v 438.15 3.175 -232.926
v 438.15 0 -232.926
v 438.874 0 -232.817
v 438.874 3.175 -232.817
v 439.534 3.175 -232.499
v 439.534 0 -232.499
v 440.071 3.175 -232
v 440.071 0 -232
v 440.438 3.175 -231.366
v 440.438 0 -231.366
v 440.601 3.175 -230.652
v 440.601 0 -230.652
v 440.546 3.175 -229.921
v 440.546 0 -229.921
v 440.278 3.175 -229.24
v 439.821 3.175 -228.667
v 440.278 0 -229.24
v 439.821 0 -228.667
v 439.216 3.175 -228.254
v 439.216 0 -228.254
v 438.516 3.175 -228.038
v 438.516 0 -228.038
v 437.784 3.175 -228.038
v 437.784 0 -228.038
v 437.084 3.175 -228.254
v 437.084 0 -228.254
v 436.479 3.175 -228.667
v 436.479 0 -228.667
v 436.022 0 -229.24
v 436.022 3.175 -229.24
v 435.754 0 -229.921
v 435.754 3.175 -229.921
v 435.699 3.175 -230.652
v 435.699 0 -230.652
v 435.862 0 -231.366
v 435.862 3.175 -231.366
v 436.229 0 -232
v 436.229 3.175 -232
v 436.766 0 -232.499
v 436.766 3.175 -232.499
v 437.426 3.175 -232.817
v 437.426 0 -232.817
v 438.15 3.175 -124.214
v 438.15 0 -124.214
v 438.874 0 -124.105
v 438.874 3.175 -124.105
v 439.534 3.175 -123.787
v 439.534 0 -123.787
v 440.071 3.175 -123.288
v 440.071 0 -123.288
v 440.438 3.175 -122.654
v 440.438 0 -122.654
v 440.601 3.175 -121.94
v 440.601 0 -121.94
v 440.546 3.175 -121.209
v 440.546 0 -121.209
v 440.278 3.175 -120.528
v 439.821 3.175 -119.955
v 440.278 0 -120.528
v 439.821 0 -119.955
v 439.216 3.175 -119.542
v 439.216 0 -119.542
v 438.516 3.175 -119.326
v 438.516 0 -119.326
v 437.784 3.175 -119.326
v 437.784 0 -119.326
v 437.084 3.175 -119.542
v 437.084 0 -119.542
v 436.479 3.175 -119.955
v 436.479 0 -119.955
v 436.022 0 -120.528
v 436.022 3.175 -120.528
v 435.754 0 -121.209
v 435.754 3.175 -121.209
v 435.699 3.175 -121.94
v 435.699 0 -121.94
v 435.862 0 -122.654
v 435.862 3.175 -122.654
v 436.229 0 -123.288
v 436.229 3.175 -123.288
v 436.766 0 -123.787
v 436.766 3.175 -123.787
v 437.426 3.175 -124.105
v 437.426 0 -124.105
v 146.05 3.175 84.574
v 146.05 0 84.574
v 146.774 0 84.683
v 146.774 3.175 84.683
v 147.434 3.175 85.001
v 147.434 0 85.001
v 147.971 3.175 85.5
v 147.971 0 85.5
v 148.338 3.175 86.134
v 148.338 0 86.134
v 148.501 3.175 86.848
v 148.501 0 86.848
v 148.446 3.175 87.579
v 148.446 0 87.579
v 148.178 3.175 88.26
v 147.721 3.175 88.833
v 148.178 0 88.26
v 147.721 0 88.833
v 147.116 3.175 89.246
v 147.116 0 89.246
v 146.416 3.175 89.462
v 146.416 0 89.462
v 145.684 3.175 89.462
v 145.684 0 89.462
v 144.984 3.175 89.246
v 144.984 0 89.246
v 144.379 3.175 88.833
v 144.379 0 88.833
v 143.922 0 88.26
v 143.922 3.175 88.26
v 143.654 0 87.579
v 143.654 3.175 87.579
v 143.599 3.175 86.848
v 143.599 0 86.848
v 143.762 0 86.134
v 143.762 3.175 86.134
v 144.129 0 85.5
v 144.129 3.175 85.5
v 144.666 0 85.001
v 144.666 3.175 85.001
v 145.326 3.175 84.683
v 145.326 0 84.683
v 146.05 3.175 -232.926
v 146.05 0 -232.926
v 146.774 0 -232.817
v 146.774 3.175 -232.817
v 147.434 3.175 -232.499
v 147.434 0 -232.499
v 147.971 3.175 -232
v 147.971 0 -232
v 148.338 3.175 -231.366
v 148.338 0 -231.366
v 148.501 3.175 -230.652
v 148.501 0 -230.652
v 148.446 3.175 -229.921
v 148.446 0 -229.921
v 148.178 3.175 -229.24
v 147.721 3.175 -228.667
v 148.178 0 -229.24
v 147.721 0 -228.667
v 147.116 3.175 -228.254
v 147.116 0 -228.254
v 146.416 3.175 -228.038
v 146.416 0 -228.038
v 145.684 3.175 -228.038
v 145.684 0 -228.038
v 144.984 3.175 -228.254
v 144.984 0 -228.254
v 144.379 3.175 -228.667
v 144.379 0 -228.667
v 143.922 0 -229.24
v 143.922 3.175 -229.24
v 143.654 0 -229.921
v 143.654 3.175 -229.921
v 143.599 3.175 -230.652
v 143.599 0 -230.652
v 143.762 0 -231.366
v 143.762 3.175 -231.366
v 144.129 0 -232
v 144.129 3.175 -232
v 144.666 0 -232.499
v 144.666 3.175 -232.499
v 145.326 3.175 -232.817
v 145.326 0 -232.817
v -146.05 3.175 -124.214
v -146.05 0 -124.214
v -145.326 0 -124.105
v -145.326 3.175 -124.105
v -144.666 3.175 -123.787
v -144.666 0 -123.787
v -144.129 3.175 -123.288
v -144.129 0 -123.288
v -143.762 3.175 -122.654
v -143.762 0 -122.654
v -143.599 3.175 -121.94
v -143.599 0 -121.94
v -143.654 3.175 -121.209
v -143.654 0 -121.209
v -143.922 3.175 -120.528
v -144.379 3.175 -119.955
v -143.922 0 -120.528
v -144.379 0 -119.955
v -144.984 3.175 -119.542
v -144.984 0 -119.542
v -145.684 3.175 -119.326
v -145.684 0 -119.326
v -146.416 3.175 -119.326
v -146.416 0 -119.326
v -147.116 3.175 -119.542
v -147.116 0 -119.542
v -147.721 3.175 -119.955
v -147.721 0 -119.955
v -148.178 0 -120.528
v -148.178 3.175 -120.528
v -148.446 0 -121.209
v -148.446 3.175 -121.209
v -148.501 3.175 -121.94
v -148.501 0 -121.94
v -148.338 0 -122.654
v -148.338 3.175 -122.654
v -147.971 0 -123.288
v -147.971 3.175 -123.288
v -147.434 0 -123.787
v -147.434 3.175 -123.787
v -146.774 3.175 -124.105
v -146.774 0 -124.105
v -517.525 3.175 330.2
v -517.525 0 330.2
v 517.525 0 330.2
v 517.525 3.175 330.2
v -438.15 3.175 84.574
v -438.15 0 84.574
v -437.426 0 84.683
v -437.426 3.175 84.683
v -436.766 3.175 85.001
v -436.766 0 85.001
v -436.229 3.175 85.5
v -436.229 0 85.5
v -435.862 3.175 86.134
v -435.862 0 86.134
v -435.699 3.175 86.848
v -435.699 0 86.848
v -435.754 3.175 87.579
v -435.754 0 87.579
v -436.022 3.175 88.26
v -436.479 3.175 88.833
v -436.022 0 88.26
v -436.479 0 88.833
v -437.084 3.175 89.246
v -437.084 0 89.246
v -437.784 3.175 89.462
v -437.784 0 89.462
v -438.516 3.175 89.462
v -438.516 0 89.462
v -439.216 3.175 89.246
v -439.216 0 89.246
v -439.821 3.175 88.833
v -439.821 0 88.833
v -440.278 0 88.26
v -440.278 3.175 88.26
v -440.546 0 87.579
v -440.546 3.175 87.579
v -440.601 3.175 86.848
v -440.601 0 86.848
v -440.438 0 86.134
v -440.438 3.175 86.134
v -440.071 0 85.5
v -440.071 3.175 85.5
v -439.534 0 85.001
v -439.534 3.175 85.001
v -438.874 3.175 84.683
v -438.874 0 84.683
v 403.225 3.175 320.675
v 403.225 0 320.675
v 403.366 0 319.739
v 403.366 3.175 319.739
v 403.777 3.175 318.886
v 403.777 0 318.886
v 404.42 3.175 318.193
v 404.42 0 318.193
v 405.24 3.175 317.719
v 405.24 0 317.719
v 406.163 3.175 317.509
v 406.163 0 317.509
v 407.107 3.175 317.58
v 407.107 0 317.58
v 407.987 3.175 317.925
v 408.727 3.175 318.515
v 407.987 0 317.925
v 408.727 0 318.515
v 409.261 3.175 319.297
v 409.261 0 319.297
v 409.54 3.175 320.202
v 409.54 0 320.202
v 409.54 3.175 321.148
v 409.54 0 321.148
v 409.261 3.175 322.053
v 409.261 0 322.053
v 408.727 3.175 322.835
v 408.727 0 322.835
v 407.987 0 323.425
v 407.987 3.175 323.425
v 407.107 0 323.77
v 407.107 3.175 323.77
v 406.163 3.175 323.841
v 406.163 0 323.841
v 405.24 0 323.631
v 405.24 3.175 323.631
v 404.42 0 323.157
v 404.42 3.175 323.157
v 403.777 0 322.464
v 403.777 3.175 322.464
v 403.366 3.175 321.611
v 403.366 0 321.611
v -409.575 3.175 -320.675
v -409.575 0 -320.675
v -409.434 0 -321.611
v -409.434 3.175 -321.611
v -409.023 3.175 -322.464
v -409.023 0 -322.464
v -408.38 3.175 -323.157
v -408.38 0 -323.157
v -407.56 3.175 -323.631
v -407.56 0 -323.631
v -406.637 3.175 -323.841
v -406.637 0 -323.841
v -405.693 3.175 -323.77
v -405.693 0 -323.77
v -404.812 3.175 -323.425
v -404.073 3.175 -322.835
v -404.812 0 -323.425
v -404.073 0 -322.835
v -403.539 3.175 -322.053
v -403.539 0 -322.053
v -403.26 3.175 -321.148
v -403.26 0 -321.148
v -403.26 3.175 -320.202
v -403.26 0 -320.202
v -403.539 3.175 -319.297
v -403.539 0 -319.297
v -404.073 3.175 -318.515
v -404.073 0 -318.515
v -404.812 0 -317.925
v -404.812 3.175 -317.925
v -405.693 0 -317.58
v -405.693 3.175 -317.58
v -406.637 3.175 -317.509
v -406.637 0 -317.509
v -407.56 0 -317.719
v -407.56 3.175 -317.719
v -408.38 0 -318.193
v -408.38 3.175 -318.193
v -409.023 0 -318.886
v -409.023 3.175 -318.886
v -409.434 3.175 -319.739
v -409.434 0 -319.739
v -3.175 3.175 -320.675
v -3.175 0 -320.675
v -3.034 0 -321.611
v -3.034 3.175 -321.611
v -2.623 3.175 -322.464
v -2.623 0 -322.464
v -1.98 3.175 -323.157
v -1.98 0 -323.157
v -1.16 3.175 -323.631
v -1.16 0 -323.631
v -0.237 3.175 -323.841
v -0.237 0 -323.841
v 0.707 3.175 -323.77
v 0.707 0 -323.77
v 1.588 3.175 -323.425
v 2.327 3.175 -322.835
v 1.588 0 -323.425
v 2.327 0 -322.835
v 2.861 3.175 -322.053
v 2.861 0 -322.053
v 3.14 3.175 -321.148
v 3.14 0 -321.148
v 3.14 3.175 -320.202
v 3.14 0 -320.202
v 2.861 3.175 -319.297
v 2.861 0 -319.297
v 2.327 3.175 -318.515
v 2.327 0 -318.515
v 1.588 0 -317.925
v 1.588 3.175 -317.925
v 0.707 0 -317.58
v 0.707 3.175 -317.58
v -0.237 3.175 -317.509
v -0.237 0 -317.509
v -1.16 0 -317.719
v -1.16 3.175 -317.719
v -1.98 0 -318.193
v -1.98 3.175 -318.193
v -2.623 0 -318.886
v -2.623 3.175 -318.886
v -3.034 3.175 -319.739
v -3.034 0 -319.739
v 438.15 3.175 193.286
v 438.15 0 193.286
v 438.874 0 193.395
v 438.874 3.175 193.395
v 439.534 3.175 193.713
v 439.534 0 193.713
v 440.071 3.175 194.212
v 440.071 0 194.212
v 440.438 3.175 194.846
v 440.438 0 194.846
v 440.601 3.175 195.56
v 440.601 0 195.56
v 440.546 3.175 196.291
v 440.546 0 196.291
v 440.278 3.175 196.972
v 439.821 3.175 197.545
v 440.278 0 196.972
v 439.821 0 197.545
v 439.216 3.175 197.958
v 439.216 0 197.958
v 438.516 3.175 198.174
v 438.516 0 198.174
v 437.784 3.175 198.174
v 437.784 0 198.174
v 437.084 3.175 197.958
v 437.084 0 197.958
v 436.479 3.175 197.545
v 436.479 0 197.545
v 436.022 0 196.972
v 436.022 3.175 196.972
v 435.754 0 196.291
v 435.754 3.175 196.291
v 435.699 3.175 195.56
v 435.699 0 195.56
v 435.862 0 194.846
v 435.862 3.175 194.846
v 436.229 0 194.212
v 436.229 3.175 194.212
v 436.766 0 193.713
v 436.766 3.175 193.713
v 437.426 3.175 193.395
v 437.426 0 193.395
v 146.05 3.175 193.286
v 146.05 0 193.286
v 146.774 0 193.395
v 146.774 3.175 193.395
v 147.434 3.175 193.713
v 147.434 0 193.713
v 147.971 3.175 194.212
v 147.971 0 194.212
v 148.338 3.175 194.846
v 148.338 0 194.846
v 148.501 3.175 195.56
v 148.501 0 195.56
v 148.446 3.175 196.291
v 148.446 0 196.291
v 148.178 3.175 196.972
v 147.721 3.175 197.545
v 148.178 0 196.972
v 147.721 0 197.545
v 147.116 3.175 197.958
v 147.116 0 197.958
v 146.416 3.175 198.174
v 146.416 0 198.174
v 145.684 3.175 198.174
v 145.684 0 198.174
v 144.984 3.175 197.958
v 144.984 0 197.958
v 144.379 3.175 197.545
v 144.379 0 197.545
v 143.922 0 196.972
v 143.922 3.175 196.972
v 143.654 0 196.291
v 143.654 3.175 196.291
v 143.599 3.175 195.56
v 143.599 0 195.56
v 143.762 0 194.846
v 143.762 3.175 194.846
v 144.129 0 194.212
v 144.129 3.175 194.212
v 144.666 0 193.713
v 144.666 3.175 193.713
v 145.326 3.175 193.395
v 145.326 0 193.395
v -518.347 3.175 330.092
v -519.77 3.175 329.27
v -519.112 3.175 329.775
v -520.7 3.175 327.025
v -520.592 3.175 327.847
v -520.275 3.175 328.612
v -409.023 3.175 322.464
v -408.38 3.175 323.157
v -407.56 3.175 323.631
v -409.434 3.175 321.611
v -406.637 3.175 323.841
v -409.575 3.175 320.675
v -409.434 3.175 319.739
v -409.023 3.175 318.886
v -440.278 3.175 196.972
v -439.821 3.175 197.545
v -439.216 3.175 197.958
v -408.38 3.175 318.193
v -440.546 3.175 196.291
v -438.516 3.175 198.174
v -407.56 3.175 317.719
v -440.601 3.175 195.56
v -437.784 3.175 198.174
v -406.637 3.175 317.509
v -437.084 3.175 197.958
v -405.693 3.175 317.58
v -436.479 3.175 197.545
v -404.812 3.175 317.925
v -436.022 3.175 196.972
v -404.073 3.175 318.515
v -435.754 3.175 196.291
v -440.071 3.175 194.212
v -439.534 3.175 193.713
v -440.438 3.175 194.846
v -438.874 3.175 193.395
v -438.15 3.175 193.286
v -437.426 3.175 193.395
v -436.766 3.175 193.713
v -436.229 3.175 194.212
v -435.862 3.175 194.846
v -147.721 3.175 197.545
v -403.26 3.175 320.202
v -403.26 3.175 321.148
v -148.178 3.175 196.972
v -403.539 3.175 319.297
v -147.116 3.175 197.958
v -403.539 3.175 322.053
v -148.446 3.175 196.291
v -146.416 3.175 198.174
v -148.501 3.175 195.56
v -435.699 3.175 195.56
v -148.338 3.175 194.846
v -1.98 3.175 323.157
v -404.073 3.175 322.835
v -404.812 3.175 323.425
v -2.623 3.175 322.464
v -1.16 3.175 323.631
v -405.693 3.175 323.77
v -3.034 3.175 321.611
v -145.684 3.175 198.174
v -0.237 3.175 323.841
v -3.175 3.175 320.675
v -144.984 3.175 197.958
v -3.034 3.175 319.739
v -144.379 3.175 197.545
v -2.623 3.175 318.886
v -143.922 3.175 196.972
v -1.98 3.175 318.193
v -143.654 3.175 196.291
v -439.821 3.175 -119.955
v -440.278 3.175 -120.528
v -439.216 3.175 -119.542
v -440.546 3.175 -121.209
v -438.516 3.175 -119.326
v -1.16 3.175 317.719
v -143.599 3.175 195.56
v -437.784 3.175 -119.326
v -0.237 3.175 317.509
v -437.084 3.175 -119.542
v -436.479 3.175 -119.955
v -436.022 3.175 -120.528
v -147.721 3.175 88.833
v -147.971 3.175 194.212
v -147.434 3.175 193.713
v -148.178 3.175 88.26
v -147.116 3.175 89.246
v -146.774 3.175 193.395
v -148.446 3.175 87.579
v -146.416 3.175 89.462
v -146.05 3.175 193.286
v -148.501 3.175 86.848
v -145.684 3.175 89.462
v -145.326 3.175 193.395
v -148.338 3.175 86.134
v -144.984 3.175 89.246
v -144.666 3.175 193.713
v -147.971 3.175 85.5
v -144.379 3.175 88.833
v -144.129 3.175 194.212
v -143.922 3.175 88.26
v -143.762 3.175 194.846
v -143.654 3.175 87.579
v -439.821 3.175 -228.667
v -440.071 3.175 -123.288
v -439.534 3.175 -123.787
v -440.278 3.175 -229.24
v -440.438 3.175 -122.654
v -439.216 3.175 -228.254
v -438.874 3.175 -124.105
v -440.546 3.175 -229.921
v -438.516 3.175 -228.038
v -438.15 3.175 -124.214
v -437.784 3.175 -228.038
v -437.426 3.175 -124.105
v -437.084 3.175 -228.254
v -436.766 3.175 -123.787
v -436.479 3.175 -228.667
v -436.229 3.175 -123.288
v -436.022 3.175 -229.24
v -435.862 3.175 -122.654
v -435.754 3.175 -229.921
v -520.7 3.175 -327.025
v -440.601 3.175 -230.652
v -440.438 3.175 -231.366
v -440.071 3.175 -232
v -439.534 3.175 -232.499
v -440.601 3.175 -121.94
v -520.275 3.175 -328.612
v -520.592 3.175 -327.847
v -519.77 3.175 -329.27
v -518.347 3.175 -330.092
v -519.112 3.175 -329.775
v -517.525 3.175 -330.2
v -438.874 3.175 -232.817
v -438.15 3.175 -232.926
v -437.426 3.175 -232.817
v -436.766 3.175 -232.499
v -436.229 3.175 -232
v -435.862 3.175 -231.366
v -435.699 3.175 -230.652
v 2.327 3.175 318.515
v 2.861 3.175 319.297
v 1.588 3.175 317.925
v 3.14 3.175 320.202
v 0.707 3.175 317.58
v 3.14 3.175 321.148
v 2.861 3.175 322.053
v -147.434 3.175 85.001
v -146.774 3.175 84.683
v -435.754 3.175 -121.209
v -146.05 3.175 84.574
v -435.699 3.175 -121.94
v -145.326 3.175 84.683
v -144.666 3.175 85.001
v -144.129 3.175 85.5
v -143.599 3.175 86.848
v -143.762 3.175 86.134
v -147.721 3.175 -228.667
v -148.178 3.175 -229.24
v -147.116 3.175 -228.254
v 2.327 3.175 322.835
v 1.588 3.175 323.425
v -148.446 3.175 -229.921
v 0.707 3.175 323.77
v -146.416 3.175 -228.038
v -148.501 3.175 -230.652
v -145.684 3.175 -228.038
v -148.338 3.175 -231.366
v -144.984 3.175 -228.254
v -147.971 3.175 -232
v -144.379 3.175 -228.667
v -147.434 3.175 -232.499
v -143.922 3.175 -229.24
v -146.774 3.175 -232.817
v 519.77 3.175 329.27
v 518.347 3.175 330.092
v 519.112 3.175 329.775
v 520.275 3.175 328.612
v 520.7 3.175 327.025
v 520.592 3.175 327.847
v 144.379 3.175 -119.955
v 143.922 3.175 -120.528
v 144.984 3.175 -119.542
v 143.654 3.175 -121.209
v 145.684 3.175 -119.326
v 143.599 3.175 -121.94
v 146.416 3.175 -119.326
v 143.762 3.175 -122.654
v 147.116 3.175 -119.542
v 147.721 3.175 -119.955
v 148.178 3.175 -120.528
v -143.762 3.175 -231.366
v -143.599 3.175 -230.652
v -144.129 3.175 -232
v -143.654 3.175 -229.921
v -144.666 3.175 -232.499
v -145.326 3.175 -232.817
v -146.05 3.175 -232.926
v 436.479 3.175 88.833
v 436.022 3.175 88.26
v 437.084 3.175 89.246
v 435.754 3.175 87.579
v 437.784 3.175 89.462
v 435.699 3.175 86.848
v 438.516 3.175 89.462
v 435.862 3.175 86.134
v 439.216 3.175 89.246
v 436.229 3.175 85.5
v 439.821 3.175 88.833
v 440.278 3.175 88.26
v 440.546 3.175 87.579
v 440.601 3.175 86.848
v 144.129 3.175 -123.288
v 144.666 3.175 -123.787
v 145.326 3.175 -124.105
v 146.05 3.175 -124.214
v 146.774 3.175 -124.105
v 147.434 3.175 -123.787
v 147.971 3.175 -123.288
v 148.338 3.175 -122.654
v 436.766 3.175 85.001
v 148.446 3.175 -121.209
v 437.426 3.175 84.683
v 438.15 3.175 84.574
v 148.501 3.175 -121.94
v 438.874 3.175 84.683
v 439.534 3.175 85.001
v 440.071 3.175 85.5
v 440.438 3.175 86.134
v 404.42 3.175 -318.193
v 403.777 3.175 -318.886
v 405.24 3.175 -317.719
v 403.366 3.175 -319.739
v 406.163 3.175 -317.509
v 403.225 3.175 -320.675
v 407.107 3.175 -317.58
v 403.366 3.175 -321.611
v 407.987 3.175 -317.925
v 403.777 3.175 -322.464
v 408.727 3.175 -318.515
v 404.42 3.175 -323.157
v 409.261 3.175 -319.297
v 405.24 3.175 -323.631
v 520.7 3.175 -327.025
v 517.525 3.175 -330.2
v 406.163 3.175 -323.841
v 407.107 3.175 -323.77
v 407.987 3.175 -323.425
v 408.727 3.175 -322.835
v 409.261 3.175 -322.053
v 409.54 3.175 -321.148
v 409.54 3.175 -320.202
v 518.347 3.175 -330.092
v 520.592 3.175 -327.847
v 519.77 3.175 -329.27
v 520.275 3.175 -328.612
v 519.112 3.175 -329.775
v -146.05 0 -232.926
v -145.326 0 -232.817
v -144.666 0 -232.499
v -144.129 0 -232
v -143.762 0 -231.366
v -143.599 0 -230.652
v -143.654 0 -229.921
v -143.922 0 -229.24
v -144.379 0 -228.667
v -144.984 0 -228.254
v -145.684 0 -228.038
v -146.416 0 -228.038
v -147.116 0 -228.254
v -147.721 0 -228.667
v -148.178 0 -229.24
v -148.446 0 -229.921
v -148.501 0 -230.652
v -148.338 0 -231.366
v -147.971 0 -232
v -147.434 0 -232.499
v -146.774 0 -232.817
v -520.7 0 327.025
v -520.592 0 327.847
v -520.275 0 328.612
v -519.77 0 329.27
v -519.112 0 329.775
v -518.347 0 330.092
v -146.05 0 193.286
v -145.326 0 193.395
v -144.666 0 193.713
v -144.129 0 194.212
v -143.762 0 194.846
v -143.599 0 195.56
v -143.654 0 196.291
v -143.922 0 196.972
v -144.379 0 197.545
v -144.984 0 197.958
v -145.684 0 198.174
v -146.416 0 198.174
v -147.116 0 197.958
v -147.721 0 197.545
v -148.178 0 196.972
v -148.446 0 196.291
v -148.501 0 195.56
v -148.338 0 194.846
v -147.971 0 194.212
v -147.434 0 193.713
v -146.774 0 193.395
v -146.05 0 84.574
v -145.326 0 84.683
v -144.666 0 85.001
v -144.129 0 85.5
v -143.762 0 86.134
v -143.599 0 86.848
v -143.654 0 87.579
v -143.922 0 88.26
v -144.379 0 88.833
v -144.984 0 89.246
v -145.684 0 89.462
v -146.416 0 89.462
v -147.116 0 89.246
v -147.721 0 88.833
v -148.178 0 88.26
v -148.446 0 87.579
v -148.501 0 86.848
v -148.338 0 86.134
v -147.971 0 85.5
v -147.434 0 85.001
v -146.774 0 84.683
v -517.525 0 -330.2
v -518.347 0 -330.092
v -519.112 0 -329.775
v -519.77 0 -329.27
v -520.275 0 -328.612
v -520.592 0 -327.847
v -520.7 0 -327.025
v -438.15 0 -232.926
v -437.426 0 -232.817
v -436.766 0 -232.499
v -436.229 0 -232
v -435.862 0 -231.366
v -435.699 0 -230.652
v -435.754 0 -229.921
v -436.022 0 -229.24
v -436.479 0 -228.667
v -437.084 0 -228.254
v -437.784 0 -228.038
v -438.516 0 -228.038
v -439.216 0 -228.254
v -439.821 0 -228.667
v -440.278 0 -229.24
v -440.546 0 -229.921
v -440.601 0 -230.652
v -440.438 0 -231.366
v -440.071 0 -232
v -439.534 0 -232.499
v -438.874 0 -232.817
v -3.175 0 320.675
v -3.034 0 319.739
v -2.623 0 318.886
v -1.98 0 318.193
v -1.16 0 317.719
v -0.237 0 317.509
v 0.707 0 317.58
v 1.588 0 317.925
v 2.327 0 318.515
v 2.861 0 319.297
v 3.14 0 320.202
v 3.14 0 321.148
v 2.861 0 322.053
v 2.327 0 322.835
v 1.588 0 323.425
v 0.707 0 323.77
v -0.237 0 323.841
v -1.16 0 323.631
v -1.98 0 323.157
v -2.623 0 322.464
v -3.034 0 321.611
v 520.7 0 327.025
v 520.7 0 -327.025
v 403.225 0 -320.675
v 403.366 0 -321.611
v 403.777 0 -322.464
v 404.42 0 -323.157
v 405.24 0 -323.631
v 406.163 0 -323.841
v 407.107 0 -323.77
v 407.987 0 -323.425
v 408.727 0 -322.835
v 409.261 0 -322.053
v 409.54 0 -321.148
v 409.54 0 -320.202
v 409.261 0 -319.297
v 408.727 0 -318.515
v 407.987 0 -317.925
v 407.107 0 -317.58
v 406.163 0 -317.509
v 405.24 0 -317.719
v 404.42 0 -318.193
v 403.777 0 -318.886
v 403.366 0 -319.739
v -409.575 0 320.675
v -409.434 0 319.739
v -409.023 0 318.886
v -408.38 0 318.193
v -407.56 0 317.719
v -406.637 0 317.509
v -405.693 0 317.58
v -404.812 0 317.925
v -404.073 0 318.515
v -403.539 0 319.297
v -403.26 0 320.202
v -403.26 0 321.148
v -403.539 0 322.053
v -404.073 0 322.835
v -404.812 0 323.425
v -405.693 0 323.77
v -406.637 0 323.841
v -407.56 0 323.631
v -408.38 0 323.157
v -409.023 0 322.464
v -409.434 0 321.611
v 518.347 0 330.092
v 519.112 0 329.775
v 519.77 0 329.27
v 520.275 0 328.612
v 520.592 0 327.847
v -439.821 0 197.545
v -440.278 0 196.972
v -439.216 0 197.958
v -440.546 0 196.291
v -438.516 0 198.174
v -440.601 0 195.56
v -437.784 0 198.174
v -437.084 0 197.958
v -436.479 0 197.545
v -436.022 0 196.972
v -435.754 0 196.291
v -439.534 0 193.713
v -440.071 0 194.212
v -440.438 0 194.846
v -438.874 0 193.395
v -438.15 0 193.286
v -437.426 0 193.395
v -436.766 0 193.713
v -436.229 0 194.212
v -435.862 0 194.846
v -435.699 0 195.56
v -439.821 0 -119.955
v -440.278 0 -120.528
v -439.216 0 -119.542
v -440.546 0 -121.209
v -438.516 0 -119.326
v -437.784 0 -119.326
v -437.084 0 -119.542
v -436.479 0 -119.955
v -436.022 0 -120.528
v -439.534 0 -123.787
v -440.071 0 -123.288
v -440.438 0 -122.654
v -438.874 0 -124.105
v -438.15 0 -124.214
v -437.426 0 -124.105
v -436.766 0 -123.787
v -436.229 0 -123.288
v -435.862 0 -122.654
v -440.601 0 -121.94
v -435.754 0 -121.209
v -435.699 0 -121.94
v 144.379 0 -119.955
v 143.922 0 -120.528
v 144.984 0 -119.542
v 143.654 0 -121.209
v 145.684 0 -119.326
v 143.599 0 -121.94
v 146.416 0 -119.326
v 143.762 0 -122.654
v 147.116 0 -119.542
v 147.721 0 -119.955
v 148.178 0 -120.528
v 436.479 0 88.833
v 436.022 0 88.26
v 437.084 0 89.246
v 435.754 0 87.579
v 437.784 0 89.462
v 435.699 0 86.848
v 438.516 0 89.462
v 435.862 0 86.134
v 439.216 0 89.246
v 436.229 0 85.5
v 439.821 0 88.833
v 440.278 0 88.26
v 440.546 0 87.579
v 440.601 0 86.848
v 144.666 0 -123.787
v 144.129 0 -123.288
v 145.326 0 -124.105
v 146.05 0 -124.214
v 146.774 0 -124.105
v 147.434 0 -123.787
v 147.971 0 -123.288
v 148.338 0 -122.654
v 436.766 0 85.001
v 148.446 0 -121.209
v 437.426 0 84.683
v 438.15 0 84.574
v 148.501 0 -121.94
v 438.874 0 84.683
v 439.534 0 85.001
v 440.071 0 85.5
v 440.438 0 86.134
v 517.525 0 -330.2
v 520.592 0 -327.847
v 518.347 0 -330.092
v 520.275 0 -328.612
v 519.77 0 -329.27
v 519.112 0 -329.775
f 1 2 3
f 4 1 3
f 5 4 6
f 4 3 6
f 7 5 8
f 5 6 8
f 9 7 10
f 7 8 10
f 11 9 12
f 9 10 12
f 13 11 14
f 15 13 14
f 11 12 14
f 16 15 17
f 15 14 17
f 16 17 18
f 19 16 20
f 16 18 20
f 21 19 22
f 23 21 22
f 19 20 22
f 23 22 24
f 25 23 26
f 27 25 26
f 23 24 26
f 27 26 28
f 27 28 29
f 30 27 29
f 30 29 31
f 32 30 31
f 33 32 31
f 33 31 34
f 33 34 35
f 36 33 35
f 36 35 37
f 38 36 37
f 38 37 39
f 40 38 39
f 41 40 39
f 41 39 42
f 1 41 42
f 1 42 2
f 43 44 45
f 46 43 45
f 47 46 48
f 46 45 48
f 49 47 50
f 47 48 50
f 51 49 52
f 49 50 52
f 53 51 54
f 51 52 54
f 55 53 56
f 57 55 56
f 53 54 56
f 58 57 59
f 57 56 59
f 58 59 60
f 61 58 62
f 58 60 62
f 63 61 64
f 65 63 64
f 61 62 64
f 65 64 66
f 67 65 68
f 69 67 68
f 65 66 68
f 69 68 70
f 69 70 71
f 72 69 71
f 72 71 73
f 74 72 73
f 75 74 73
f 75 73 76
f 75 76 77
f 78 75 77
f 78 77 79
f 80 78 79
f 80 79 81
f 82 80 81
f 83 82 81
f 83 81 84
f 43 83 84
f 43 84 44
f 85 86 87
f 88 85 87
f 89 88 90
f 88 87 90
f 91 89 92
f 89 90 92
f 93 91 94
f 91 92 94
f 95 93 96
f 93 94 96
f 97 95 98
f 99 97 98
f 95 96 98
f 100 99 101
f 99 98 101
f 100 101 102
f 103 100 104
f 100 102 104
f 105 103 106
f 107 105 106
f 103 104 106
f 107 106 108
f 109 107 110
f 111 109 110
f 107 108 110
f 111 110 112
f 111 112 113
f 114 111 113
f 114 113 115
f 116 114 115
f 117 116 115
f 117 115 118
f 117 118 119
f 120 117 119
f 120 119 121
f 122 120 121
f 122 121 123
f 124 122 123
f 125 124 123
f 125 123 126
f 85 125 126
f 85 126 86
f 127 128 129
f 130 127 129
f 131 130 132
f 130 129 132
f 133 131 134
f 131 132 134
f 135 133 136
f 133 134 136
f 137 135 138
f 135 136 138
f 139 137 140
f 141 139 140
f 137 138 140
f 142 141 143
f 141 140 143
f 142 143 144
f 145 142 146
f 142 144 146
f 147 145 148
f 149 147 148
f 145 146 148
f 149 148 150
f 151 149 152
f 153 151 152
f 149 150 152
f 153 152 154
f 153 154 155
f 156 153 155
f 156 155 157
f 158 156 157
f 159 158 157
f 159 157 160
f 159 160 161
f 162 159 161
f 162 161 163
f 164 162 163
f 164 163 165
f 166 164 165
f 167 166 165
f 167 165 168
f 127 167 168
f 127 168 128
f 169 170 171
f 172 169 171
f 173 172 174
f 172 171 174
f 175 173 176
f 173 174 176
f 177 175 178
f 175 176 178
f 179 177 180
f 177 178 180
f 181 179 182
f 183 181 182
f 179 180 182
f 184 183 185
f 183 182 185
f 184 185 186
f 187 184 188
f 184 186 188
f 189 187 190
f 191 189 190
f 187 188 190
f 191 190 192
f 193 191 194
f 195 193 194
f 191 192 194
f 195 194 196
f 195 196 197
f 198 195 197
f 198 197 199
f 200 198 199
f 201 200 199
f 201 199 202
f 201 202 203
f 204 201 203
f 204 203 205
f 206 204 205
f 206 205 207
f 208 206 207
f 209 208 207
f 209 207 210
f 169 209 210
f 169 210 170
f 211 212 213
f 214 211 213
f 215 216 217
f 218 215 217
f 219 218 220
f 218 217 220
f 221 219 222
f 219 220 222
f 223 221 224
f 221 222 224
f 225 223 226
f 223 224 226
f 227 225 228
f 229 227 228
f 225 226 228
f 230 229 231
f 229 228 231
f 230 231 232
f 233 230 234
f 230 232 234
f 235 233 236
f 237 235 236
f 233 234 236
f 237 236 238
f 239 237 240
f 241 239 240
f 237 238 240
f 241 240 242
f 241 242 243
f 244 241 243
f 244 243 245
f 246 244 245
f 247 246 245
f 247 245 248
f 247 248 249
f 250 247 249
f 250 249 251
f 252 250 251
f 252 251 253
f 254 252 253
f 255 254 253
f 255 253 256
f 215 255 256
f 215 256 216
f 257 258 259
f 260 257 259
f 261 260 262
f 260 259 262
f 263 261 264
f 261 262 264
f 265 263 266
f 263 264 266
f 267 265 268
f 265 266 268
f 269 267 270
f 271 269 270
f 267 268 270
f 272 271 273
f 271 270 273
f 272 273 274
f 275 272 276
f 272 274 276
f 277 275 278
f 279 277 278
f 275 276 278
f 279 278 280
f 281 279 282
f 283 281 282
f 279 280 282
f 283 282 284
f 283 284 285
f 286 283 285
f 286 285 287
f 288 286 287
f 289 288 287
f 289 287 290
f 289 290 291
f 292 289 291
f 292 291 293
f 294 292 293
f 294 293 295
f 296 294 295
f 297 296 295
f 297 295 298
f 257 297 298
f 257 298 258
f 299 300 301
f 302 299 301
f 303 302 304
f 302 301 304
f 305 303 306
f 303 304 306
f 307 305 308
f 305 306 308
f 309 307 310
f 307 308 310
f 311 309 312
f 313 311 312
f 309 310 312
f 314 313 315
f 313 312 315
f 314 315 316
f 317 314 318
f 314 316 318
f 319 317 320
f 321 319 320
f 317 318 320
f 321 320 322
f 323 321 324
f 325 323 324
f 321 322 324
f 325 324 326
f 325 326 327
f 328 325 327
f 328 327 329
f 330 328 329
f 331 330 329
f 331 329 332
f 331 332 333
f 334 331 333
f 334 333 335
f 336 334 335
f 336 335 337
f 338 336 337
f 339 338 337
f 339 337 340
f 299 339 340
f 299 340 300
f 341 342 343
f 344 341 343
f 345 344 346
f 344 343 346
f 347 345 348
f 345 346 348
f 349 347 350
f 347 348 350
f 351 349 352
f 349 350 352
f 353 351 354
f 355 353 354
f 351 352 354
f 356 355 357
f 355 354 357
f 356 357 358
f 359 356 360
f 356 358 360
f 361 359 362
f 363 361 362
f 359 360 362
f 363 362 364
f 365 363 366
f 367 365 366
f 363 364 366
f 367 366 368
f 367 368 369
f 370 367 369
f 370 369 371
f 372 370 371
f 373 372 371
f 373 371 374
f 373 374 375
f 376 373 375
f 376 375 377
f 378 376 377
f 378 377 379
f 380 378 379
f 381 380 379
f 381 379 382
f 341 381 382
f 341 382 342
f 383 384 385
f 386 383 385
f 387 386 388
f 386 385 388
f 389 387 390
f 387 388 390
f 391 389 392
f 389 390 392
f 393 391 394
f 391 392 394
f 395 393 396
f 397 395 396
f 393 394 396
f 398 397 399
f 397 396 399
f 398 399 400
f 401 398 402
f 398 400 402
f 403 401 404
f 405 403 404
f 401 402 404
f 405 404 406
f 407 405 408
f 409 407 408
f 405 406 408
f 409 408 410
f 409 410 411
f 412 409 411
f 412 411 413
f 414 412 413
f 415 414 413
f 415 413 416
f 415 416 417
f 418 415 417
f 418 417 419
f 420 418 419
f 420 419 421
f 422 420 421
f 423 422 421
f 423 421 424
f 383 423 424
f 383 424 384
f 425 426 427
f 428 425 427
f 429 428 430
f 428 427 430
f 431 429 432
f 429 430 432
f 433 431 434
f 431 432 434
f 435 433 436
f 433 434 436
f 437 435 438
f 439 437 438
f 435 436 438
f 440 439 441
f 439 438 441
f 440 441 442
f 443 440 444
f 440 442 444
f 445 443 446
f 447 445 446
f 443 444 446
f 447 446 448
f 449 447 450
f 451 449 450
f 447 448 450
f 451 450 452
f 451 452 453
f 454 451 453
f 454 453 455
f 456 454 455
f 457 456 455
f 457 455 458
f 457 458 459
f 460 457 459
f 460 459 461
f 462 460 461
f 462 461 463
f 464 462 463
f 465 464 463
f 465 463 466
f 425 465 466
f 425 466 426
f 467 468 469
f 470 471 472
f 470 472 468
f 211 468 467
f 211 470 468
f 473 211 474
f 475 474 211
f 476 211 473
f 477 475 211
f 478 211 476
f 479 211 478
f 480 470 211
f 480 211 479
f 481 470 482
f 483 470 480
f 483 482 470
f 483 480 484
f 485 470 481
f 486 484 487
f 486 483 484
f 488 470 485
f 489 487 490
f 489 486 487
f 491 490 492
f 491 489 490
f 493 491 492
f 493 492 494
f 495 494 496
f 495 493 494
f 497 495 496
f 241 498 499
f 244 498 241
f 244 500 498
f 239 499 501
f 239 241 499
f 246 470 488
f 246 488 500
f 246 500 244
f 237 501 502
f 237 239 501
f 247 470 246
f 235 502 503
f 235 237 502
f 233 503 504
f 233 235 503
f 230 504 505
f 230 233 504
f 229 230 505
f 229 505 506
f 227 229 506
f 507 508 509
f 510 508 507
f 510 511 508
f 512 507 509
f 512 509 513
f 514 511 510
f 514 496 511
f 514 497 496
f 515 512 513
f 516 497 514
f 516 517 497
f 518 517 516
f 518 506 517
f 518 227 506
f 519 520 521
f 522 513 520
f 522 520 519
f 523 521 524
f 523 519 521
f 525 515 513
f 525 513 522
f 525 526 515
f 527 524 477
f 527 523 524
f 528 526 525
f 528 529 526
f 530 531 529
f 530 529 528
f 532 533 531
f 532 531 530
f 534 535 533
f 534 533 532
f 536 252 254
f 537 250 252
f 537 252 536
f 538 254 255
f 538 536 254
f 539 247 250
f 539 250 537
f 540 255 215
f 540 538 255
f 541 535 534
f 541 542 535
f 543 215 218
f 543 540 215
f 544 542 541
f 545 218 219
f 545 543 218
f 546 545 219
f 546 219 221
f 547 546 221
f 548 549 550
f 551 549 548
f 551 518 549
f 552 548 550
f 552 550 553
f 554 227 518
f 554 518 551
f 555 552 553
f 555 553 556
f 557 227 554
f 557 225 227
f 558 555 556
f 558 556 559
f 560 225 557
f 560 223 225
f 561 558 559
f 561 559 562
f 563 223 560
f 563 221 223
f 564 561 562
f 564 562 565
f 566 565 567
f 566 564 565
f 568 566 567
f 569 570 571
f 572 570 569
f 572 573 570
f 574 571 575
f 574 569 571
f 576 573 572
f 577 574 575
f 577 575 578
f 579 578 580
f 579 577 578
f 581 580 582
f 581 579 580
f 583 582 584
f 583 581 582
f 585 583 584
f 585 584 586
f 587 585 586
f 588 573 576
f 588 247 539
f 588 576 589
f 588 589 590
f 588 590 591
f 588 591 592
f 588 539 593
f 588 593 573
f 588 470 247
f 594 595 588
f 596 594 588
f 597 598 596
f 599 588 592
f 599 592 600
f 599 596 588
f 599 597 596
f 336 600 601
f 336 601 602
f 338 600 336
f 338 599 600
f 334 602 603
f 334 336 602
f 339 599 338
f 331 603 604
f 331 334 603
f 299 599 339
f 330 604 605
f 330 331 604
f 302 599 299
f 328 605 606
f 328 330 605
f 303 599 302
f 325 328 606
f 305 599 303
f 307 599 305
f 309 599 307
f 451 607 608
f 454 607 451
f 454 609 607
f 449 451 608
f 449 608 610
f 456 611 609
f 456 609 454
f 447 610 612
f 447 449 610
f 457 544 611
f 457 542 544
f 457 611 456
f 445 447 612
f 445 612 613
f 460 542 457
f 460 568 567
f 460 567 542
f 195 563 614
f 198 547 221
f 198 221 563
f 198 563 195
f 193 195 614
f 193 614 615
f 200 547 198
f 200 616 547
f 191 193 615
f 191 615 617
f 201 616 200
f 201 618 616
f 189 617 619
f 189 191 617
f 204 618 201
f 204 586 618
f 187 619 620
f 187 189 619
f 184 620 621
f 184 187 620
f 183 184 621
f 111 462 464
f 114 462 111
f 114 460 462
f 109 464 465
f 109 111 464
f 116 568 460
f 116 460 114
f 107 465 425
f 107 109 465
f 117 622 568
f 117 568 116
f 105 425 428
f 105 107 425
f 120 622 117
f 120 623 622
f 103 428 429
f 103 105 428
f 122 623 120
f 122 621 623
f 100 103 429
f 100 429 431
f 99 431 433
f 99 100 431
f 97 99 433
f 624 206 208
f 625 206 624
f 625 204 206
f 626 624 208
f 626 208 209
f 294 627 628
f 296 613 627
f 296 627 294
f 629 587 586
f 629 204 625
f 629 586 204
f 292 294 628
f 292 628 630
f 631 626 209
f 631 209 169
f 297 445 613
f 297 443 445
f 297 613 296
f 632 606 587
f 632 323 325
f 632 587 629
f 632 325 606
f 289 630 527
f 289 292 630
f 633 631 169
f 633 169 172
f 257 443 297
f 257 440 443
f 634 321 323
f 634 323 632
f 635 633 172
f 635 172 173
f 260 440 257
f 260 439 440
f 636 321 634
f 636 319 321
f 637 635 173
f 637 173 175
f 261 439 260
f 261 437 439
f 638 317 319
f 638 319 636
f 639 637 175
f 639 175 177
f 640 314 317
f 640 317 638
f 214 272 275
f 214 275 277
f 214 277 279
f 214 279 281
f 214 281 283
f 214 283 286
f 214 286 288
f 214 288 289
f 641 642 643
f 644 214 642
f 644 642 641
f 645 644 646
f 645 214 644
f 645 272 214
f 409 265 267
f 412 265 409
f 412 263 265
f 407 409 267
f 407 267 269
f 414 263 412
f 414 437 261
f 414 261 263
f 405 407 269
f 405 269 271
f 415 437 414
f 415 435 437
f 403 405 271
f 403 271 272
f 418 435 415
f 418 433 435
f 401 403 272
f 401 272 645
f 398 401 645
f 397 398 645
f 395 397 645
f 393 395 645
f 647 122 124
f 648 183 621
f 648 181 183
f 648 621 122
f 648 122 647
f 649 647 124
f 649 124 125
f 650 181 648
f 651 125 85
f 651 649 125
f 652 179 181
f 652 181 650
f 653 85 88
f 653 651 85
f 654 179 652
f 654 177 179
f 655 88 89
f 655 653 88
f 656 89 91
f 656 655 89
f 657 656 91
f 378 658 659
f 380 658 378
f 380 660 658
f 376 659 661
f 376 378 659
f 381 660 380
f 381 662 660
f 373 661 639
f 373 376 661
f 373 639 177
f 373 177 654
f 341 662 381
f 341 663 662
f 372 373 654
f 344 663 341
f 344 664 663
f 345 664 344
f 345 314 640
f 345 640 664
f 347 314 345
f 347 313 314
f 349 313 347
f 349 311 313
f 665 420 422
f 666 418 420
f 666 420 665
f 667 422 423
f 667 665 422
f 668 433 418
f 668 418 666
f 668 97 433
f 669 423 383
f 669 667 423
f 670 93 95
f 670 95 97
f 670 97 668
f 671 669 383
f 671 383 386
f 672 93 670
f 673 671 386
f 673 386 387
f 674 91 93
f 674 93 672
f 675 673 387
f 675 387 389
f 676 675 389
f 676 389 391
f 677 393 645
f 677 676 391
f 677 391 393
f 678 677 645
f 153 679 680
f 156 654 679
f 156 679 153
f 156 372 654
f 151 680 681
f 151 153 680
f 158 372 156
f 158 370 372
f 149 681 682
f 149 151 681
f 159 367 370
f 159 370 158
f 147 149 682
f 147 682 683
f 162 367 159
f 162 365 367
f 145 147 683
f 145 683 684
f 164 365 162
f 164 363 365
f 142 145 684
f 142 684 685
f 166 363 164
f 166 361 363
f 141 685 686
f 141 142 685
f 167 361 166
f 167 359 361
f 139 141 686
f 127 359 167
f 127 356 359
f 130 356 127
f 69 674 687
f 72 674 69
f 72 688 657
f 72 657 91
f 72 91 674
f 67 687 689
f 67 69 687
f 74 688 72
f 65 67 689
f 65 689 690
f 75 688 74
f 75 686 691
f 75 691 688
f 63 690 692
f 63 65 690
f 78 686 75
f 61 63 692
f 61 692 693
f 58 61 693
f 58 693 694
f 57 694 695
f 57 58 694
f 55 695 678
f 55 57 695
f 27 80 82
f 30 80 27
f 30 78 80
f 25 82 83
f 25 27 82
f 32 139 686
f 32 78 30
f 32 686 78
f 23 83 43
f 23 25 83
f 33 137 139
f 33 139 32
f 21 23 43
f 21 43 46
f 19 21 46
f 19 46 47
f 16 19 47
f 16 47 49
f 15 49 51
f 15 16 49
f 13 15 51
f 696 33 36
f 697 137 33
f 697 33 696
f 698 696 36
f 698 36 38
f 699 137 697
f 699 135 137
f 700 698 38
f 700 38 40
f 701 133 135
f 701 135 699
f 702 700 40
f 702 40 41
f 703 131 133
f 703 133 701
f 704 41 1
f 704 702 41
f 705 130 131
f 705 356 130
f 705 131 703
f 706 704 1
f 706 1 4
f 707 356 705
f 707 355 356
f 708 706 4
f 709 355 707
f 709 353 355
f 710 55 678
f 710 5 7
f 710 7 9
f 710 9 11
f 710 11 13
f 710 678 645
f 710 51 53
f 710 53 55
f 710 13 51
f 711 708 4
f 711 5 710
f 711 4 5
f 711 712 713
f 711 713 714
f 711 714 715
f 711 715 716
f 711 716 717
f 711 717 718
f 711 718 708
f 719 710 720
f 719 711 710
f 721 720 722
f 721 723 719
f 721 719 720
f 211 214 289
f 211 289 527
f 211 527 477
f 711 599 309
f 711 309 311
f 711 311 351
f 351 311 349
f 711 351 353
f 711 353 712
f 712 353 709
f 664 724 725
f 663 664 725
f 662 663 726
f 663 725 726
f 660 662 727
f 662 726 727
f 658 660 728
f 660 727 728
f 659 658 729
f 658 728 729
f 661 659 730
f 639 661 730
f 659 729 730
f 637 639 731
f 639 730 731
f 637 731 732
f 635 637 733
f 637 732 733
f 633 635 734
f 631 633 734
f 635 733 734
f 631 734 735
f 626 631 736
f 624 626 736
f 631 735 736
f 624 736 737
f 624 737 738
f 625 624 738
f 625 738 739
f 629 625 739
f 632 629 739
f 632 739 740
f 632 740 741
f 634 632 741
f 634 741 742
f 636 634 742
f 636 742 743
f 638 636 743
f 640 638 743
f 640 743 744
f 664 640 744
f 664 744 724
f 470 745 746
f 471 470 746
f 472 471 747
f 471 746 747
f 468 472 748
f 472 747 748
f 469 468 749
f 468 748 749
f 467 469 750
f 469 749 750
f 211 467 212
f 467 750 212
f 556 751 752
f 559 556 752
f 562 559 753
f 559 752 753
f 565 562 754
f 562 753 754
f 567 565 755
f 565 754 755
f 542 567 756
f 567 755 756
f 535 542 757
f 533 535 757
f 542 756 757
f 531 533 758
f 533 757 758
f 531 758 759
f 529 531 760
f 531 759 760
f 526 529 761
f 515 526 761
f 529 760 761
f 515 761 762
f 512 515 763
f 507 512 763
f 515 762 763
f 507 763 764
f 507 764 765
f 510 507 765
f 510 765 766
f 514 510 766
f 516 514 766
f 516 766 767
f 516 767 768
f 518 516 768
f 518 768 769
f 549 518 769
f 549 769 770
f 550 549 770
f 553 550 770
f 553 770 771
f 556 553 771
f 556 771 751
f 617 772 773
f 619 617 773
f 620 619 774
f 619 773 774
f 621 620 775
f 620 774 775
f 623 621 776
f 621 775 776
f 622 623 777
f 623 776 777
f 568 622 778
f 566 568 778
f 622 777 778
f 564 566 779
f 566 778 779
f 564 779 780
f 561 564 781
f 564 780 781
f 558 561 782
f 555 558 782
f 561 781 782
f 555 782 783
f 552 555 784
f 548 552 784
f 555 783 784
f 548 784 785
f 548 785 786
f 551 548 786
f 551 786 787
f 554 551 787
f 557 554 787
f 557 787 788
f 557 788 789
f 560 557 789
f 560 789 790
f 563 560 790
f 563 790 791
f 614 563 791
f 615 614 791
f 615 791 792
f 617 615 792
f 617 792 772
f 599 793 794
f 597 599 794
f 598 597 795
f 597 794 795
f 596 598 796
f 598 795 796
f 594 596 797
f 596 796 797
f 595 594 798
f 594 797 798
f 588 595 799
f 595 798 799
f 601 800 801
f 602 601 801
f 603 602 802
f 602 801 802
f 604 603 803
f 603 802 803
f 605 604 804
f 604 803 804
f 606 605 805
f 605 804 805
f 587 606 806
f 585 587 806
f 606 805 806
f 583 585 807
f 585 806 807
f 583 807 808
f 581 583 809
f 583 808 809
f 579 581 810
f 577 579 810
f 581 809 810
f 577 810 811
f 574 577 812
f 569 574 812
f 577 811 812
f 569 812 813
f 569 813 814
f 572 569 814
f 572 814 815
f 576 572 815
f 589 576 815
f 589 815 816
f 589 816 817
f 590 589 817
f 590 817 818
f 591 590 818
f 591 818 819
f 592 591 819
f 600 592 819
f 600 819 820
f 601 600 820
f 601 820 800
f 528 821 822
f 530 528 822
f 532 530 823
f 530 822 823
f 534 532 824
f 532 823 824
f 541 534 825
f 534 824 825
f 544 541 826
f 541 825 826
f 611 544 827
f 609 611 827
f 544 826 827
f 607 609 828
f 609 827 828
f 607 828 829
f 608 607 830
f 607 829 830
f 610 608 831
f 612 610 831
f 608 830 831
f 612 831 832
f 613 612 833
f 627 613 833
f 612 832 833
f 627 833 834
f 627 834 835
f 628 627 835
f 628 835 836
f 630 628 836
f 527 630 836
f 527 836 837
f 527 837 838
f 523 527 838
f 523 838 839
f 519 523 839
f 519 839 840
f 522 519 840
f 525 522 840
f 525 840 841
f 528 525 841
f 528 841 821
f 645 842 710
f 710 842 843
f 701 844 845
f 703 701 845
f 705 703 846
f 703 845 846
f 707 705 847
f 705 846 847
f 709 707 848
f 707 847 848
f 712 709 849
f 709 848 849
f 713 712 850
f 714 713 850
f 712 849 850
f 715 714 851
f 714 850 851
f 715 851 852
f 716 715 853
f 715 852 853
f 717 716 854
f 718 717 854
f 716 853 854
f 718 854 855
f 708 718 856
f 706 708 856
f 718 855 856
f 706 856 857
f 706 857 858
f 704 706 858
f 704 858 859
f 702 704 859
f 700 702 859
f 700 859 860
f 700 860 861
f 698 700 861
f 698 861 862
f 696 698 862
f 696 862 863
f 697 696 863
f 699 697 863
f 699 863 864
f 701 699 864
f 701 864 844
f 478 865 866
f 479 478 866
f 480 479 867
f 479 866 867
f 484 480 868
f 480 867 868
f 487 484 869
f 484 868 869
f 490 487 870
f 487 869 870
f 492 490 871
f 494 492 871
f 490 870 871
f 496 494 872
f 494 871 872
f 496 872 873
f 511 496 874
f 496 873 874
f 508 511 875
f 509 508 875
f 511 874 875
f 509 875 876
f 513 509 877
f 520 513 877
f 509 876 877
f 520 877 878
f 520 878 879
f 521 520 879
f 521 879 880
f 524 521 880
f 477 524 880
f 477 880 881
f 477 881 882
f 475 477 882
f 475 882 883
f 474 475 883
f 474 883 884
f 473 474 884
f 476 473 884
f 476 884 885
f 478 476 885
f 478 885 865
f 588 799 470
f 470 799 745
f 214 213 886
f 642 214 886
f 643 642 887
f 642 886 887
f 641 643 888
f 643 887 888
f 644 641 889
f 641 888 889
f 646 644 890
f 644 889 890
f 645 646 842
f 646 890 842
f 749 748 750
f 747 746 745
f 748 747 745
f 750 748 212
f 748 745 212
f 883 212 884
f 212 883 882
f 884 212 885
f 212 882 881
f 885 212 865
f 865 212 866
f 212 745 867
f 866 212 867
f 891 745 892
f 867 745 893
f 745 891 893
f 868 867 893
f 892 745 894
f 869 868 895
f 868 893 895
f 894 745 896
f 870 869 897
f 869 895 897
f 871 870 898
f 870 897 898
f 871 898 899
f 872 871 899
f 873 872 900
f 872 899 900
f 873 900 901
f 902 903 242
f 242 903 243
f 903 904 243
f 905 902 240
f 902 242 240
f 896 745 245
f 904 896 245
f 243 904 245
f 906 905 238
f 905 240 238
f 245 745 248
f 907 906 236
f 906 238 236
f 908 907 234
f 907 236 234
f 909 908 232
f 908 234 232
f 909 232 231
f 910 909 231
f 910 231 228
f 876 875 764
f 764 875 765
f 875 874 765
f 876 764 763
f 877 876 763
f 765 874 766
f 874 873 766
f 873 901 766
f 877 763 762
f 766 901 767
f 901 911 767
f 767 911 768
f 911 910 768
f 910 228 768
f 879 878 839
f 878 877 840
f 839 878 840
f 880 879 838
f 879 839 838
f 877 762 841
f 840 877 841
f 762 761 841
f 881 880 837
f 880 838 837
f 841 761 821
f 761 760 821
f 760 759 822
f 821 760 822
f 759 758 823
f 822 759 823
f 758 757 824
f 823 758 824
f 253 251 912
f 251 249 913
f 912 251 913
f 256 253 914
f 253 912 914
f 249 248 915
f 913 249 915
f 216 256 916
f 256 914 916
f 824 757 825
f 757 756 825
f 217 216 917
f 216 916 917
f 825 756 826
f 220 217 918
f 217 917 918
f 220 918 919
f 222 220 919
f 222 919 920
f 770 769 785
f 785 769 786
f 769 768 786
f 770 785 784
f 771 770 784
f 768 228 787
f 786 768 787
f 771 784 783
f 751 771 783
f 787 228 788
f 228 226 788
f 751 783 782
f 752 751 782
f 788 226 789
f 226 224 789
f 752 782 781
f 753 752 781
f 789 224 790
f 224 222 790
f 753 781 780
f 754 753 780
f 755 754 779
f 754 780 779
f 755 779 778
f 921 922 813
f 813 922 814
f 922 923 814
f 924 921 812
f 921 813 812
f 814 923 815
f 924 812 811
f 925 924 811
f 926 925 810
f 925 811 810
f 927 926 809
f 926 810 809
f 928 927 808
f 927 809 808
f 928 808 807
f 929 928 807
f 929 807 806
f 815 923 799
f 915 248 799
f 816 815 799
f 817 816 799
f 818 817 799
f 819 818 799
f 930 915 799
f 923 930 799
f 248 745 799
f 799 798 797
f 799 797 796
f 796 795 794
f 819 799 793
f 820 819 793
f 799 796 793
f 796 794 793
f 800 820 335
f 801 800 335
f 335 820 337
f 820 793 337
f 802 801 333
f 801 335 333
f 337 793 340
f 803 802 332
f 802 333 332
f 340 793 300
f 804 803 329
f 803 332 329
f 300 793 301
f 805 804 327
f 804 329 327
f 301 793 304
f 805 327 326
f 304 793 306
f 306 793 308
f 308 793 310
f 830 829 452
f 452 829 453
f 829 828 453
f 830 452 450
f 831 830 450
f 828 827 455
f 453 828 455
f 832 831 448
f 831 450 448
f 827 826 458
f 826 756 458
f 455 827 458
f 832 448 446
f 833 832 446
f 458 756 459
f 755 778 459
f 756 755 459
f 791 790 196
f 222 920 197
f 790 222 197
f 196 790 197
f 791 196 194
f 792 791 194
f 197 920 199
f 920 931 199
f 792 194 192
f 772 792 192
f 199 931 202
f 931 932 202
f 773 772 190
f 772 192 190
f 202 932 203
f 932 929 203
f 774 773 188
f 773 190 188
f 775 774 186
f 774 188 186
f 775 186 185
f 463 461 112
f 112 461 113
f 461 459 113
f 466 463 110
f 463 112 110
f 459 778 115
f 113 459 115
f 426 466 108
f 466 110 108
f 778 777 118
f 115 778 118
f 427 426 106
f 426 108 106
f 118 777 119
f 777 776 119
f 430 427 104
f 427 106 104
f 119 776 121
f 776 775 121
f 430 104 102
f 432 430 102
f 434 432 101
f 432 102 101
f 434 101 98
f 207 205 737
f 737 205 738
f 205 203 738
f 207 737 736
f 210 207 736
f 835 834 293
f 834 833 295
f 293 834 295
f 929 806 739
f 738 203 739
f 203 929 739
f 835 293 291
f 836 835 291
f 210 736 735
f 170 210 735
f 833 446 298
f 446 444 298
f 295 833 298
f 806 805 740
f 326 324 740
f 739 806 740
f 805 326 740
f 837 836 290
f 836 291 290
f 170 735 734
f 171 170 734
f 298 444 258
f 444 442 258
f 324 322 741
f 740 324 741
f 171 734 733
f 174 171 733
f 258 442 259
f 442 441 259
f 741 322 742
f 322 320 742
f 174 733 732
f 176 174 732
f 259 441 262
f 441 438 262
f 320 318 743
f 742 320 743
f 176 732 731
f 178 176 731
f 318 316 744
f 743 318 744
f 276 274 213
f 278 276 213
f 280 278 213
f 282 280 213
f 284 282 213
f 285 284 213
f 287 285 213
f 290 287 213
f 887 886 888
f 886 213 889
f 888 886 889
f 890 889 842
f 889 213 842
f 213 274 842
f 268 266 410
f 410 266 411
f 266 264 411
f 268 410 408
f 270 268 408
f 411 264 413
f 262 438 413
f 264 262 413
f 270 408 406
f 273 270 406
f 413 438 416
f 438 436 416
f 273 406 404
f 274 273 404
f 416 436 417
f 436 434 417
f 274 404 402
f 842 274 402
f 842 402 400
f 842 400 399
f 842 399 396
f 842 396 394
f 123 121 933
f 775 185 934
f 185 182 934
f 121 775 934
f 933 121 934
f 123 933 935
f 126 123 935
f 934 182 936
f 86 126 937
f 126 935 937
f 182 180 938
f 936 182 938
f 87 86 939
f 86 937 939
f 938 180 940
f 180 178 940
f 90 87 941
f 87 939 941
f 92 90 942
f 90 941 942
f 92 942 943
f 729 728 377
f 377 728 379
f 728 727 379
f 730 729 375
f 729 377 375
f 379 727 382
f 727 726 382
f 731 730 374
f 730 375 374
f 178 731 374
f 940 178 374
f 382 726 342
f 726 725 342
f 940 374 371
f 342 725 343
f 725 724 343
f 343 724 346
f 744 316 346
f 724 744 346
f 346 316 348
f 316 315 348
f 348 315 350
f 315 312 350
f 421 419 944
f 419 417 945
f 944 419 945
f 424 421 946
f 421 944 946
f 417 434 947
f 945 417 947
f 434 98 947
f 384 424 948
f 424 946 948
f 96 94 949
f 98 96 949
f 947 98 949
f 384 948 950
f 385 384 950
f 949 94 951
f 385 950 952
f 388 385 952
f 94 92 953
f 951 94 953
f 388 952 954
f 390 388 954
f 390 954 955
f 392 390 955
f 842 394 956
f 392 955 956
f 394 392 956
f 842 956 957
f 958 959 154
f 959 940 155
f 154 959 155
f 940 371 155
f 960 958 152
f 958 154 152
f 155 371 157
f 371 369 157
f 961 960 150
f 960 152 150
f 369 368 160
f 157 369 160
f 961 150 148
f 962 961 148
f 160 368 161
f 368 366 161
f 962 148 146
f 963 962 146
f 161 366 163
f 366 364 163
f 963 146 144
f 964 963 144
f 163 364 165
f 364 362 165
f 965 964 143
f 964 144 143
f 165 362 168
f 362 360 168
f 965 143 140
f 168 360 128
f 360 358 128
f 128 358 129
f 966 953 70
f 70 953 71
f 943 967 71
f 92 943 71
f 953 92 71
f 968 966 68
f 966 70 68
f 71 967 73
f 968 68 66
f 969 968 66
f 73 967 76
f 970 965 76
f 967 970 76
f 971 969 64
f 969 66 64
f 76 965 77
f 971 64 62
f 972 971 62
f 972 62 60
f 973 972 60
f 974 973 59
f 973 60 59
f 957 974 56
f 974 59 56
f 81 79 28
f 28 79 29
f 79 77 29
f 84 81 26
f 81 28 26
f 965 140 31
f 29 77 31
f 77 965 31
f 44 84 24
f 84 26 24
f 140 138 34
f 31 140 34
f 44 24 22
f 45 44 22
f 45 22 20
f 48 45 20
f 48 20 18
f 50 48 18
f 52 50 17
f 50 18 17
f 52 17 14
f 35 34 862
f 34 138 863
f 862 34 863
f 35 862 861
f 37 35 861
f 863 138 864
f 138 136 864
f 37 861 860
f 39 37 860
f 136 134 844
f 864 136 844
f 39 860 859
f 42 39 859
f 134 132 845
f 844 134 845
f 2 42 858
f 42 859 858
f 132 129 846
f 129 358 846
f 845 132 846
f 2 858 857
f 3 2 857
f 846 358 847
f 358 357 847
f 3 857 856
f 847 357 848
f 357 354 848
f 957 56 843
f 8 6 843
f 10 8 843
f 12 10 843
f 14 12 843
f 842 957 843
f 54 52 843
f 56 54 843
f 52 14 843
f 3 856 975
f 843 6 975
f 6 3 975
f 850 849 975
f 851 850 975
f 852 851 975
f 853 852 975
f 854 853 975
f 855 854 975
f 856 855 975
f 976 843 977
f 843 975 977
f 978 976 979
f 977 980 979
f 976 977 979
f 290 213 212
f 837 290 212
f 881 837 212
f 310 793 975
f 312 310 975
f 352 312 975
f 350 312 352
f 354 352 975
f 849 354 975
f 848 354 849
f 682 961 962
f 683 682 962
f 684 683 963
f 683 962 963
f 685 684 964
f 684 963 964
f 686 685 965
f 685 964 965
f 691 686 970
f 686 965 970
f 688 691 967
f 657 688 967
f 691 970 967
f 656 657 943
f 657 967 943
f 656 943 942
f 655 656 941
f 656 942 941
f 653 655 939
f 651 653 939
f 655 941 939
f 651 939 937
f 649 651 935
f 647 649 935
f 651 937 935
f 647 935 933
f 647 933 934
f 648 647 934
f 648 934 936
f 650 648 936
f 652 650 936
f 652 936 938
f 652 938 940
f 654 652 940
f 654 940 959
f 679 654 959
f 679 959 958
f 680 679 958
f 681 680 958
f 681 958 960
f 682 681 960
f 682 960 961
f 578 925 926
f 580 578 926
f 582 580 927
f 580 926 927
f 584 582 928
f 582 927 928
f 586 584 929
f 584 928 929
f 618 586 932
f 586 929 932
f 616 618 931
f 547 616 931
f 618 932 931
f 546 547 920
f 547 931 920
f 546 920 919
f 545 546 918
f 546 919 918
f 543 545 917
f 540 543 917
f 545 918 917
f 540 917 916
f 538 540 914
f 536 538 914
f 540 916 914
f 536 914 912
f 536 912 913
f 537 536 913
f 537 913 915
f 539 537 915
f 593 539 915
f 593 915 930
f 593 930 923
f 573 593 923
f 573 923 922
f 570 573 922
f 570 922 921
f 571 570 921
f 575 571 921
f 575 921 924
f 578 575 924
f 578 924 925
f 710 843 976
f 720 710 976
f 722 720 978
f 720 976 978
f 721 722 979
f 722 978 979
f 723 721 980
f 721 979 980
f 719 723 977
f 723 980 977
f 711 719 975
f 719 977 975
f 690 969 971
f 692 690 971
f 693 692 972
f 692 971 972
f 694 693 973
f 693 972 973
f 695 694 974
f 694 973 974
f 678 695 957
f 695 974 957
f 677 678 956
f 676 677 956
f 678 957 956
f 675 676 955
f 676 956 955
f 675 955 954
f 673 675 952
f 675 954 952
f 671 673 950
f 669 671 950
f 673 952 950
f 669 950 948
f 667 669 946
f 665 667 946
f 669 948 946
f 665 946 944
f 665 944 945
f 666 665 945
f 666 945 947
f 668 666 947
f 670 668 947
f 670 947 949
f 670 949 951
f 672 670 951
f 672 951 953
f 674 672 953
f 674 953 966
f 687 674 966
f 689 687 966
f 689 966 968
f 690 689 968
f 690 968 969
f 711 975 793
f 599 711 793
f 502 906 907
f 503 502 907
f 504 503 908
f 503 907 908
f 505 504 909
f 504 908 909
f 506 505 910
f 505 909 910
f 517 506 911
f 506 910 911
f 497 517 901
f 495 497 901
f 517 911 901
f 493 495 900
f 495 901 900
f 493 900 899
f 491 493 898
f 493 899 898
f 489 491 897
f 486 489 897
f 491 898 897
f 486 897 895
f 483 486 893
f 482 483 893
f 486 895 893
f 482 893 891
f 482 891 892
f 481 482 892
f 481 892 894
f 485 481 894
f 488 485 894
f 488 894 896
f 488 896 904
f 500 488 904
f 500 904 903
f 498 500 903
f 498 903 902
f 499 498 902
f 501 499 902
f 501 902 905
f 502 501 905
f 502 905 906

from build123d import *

# Parameters (mm, degrees)
BOSS_EXTRUDE1_DEPTH          = 3.175
F_1_4_0_25_DIAMETER_HOLE1_D  = 6.35
F_10_0_1935_DIAMETER_HOLE1_D = 4.9149


with BuildPart() as part:
    # Sketch1 → Boss-Extrude1 (new body)
    with BuildSketch(Plane(origin=(0, 0, 0), x_dir=(1, 0, 0), z_dir=(0, 1, 0))):
        with BuildLine():
            Line((-517.525, -330.2), (517.525, -330.2))
            ThreePointArc((517.525, -330.2), (519.77006403, -329.27006403), (520.7, -327.025))
            Line((520.7, -327.025), (520.7, 327.025))
            ThreePointArc((520.7, 327.025), (519.77006403, 329.27006403), (517.525, 330.2))
            Line((517.525, 330.2), (-517.525, 330.2))
            ThreePointArc((-517.525, 330.2), (-519.77006403, 329.27006403), (-520.7, 327.025))
            Line((-520.7, 327.025), (-520.7, -327.025))
            ThreePointArc((-520.7, -327.025), (-519.77006403, -329.27006403), (-517.525, -330.2))
        make_face()
    extrude(amount=BOSS_EXTRUDE1_DEPTH)

    # 1/4 (0.25) Diameter Hole1 (through all)
    with Locations(Plane(origin=(0, 3.175, 0), x_dir=(1, 0, 0), z_dir=(0, 1, 0))):
        with Locations((-406.4, 320.675), (0, 320.675), (406.4, 320.675), (406.4, -320.675), (0, -320.675), (-406.4, -320.675)):
            Hole(F_1_4_0_25_DIAMETER_HOLE1_D / 2)

    # #10 (0.1935) Diameter Hole1 (through all)
    with Locations(Plane(origin=(-438.15, 3.175, -230.468256121), x_dir=(0, 0, 1), z_dir=(0, 1, 0))):
        with Locations((0, 0), (108.712, 0), (108.712, 292.1), (0, 292.1), (108.712, 584.2), (0, 584.2), (0, 876.3), (108.712, 876.3), (317.5, 0), (426.212, 0), (426.212, 292.1), (317.5, 292.1), (317.5, 584.2), (426.212, 584.2), (317.5, 876.3), (426.212, 876.3)):
            Hole(F_10_0_1935_DIAMETER_HOLE1_D / 2)


solid = part.part
